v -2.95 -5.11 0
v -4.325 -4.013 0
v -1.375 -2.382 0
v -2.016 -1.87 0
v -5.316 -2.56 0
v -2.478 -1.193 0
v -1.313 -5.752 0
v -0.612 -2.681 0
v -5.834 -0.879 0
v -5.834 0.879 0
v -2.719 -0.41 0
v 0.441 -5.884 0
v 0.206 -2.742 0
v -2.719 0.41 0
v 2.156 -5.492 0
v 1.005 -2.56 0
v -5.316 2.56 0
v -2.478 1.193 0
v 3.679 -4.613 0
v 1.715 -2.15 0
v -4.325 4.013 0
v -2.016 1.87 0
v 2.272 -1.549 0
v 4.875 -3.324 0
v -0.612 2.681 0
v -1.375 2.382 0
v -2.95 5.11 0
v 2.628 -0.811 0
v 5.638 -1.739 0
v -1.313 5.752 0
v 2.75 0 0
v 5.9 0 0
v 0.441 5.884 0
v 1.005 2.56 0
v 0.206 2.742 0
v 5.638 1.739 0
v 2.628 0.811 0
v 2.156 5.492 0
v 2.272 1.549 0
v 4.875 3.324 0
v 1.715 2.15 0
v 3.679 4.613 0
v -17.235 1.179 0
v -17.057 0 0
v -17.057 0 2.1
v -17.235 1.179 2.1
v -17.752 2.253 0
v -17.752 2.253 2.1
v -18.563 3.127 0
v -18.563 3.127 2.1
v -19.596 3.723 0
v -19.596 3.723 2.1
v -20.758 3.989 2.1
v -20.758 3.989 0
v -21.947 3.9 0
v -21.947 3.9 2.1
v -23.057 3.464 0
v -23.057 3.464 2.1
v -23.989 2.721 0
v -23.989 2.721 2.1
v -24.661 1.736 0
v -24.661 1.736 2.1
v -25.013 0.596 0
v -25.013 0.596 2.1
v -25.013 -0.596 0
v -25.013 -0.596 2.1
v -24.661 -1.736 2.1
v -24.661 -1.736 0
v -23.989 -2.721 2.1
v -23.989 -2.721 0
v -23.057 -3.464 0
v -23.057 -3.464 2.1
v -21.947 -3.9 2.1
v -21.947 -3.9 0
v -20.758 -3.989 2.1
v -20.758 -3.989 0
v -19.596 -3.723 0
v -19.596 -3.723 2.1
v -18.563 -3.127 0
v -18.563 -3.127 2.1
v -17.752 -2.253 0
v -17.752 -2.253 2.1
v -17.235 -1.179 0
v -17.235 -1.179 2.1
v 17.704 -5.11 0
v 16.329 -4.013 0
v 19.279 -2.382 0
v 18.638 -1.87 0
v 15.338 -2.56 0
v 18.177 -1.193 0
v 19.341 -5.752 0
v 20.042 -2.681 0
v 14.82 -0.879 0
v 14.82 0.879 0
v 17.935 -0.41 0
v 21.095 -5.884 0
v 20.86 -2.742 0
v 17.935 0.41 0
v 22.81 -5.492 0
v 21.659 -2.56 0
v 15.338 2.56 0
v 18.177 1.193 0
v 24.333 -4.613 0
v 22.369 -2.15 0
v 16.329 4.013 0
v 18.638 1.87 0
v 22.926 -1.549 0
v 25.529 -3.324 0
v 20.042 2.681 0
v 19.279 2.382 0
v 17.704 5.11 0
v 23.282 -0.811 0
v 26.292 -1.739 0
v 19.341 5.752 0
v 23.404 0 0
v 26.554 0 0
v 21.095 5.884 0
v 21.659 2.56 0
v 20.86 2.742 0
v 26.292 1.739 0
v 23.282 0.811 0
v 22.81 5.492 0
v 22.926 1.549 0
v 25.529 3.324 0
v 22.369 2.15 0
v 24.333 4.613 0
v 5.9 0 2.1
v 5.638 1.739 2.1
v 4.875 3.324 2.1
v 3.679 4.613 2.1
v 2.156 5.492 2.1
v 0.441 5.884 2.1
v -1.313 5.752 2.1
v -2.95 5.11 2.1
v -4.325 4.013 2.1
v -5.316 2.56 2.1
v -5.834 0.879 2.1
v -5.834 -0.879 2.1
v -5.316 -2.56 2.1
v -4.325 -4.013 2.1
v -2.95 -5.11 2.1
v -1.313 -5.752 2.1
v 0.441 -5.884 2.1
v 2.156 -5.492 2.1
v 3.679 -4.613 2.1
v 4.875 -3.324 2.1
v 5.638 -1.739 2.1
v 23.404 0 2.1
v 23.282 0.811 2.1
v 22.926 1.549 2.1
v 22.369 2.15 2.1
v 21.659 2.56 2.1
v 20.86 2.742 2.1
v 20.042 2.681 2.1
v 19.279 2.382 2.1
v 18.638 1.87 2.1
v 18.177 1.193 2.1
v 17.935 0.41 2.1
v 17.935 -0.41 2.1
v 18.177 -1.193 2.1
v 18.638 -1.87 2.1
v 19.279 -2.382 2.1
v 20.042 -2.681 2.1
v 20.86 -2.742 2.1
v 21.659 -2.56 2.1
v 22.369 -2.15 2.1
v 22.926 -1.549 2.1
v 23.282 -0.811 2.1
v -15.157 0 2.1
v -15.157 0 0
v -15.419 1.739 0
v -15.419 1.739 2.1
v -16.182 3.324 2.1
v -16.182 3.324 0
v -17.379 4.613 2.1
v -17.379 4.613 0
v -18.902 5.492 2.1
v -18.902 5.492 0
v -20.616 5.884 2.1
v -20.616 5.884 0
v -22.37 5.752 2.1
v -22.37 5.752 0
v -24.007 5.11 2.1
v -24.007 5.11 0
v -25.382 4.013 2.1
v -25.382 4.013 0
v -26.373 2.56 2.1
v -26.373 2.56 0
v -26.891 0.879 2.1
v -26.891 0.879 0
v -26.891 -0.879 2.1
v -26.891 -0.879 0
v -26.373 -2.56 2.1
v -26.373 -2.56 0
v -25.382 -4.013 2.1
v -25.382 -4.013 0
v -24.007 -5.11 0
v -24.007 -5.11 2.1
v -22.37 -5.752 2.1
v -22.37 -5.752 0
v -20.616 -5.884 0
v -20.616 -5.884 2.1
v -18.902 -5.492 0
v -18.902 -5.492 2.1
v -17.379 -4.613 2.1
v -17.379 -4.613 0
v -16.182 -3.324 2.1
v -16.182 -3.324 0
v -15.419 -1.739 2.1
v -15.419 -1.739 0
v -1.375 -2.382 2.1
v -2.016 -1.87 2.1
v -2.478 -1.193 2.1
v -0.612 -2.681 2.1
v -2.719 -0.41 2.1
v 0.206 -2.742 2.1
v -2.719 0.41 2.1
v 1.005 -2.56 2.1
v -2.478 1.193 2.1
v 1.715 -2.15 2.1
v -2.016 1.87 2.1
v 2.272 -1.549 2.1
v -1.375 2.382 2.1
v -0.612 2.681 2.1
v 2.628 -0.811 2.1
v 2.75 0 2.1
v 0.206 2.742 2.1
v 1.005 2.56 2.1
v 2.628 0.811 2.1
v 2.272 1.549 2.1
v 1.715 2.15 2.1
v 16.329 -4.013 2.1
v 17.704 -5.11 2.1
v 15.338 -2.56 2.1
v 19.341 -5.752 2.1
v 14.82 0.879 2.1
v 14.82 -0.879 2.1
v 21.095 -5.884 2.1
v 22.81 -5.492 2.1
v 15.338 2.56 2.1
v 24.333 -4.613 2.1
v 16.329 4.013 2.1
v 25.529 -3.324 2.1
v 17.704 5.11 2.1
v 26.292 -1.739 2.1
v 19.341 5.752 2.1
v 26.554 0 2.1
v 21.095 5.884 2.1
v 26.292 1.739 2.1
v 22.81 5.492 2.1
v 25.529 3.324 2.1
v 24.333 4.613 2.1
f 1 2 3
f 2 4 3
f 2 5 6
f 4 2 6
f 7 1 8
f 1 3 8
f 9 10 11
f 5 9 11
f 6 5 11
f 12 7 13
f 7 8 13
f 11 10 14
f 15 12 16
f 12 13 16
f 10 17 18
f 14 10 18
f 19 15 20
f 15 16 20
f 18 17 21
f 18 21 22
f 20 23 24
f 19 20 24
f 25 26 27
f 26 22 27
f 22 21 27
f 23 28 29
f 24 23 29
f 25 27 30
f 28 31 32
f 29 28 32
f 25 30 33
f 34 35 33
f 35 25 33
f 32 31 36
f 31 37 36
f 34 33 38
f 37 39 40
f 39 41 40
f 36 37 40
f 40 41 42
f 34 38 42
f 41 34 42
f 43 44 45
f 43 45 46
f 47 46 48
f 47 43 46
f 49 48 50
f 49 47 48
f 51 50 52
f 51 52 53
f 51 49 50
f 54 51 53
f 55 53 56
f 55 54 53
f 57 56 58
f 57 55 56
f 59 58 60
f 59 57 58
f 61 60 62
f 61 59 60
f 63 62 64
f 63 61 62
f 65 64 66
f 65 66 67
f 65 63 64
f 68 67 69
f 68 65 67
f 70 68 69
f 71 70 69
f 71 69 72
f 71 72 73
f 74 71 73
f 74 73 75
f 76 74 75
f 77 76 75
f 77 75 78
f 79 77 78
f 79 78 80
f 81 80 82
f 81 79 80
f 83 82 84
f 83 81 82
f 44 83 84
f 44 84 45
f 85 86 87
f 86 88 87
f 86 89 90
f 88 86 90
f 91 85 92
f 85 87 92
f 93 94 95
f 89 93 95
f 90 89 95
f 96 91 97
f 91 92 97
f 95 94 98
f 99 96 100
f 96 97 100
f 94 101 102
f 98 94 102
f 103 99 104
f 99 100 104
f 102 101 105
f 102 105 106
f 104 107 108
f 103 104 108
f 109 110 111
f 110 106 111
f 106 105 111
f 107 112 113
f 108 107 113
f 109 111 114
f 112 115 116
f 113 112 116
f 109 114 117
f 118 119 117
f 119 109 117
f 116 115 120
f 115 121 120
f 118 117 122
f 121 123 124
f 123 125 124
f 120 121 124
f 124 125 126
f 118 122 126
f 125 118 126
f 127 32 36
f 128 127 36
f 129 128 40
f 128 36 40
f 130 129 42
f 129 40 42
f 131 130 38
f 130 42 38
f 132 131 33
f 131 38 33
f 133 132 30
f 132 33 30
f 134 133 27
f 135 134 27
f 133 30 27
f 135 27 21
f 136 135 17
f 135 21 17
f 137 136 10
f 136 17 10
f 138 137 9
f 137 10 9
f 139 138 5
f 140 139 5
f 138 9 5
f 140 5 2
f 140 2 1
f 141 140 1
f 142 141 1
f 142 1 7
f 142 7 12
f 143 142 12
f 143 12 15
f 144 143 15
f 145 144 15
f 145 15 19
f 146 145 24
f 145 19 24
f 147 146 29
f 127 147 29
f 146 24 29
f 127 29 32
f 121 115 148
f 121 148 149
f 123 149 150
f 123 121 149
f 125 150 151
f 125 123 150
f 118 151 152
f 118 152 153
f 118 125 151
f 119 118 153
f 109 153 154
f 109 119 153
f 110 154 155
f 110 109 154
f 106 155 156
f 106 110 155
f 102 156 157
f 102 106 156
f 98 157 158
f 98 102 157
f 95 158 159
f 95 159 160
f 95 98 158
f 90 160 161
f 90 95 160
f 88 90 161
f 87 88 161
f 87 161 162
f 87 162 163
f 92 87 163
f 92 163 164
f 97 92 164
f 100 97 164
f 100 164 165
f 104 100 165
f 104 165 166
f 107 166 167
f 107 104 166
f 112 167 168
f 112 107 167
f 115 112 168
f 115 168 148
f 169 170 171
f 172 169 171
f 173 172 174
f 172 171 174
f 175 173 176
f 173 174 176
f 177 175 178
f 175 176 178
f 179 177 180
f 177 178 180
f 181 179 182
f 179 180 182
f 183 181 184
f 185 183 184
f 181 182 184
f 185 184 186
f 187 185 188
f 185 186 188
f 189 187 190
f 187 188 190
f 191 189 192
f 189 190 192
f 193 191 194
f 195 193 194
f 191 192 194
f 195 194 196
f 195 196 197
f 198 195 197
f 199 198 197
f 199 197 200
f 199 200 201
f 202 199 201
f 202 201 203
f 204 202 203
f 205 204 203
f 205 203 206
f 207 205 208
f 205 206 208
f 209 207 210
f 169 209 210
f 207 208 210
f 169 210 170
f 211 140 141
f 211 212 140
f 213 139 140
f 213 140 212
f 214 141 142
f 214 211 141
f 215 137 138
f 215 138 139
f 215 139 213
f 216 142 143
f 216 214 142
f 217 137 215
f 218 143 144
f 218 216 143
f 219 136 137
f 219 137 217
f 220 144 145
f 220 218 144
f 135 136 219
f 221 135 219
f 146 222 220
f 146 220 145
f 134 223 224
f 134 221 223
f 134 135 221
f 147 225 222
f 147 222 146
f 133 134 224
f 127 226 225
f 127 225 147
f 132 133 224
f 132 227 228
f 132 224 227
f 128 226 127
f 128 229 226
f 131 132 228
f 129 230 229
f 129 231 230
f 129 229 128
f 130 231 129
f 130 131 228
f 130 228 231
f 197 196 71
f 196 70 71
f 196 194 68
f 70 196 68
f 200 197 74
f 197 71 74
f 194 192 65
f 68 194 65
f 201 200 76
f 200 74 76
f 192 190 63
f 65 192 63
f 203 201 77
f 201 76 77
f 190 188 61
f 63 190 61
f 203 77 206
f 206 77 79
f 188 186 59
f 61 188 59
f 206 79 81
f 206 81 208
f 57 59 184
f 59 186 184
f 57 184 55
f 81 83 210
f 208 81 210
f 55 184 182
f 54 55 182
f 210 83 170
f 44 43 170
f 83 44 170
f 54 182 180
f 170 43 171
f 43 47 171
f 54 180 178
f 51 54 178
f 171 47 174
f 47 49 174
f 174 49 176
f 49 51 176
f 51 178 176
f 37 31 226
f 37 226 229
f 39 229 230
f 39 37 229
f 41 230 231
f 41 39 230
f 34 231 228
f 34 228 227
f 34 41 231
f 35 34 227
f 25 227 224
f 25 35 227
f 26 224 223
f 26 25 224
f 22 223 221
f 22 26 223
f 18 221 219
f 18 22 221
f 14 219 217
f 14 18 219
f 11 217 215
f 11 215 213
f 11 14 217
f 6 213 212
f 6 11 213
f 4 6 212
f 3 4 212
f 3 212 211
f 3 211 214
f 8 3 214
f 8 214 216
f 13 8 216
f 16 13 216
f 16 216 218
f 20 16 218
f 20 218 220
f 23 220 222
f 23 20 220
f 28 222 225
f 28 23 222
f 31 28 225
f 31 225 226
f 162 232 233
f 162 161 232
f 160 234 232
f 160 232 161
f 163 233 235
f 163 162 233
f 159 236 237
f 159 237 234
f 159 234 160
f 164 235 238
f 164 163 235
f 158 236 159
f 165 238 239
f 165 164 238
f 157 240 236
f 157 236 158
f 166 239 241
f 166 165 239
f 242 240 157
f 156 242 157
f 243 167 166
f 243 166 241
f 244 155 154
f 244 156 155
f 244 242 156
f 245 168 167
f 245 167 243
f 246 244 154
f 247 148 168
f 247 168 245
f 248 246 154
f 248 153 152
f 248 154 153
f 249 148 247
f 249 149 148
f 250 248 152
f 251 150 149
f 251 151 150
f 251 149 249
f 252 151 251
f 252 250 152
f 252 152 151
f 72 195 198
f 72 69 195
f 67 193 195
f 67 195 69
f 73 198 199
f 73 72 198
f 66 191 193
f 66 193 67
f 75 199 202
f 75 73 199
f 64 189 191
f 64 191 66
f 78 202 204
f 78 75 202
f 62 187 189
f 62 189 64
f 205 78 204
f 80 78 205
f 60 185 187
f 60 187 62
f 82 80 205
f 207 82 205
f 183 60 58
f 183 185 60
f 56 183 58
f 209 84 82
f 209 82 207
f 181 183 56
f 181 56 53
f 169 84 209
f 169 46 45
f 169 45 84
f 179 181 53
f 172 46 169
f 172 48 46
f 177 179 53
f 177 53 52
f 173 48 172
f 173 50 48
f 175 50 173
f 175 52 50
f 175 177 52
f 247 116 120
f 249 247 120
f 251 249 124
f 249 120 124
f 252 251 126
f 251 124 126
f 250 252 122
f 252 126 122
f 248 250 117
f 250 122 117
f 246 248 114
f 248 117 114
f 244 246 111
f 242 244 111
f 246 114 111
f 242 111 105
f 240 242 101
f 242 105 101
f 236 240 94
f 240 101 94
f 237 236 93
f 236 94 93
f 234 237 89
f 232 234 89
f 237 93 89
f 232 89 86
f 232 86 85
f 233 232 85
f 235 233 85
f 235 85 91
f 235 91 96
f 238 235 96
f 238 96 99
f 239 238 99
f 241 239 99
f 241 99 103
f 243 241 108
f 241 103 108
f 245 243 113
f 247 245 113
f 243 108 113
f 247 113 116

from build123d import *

# Parameters (mm, degrees)
F0_R     = 5.9
F0_R_2   = 2.75
F0_R_3   = 4
F1_DEPTH = 2.1


with BuildPart() as f1:
    # F0 (on Top) → F1 (new body)
    with BuildSketch(Plane.XY):
        Circle(F0_R)
        Circle(F0_R_2, mode=Mode.SUBTRACT)
        with Locations((-21.057213, 0)):
            Circle(F0_R)
        with Locations((-21.057213, 0)):
            Circle(F0_R_3, mode=Mode.SUBTRACT)
        with Locations((20.654204, 0)):
            Circle(F0_R)
        with Locations((20.654204, 0)):
            Circle(F0_R_2, mode=Mode.SUBTRACT)
    extrude(amount=F1_DEPTH)


solid = f1.part
